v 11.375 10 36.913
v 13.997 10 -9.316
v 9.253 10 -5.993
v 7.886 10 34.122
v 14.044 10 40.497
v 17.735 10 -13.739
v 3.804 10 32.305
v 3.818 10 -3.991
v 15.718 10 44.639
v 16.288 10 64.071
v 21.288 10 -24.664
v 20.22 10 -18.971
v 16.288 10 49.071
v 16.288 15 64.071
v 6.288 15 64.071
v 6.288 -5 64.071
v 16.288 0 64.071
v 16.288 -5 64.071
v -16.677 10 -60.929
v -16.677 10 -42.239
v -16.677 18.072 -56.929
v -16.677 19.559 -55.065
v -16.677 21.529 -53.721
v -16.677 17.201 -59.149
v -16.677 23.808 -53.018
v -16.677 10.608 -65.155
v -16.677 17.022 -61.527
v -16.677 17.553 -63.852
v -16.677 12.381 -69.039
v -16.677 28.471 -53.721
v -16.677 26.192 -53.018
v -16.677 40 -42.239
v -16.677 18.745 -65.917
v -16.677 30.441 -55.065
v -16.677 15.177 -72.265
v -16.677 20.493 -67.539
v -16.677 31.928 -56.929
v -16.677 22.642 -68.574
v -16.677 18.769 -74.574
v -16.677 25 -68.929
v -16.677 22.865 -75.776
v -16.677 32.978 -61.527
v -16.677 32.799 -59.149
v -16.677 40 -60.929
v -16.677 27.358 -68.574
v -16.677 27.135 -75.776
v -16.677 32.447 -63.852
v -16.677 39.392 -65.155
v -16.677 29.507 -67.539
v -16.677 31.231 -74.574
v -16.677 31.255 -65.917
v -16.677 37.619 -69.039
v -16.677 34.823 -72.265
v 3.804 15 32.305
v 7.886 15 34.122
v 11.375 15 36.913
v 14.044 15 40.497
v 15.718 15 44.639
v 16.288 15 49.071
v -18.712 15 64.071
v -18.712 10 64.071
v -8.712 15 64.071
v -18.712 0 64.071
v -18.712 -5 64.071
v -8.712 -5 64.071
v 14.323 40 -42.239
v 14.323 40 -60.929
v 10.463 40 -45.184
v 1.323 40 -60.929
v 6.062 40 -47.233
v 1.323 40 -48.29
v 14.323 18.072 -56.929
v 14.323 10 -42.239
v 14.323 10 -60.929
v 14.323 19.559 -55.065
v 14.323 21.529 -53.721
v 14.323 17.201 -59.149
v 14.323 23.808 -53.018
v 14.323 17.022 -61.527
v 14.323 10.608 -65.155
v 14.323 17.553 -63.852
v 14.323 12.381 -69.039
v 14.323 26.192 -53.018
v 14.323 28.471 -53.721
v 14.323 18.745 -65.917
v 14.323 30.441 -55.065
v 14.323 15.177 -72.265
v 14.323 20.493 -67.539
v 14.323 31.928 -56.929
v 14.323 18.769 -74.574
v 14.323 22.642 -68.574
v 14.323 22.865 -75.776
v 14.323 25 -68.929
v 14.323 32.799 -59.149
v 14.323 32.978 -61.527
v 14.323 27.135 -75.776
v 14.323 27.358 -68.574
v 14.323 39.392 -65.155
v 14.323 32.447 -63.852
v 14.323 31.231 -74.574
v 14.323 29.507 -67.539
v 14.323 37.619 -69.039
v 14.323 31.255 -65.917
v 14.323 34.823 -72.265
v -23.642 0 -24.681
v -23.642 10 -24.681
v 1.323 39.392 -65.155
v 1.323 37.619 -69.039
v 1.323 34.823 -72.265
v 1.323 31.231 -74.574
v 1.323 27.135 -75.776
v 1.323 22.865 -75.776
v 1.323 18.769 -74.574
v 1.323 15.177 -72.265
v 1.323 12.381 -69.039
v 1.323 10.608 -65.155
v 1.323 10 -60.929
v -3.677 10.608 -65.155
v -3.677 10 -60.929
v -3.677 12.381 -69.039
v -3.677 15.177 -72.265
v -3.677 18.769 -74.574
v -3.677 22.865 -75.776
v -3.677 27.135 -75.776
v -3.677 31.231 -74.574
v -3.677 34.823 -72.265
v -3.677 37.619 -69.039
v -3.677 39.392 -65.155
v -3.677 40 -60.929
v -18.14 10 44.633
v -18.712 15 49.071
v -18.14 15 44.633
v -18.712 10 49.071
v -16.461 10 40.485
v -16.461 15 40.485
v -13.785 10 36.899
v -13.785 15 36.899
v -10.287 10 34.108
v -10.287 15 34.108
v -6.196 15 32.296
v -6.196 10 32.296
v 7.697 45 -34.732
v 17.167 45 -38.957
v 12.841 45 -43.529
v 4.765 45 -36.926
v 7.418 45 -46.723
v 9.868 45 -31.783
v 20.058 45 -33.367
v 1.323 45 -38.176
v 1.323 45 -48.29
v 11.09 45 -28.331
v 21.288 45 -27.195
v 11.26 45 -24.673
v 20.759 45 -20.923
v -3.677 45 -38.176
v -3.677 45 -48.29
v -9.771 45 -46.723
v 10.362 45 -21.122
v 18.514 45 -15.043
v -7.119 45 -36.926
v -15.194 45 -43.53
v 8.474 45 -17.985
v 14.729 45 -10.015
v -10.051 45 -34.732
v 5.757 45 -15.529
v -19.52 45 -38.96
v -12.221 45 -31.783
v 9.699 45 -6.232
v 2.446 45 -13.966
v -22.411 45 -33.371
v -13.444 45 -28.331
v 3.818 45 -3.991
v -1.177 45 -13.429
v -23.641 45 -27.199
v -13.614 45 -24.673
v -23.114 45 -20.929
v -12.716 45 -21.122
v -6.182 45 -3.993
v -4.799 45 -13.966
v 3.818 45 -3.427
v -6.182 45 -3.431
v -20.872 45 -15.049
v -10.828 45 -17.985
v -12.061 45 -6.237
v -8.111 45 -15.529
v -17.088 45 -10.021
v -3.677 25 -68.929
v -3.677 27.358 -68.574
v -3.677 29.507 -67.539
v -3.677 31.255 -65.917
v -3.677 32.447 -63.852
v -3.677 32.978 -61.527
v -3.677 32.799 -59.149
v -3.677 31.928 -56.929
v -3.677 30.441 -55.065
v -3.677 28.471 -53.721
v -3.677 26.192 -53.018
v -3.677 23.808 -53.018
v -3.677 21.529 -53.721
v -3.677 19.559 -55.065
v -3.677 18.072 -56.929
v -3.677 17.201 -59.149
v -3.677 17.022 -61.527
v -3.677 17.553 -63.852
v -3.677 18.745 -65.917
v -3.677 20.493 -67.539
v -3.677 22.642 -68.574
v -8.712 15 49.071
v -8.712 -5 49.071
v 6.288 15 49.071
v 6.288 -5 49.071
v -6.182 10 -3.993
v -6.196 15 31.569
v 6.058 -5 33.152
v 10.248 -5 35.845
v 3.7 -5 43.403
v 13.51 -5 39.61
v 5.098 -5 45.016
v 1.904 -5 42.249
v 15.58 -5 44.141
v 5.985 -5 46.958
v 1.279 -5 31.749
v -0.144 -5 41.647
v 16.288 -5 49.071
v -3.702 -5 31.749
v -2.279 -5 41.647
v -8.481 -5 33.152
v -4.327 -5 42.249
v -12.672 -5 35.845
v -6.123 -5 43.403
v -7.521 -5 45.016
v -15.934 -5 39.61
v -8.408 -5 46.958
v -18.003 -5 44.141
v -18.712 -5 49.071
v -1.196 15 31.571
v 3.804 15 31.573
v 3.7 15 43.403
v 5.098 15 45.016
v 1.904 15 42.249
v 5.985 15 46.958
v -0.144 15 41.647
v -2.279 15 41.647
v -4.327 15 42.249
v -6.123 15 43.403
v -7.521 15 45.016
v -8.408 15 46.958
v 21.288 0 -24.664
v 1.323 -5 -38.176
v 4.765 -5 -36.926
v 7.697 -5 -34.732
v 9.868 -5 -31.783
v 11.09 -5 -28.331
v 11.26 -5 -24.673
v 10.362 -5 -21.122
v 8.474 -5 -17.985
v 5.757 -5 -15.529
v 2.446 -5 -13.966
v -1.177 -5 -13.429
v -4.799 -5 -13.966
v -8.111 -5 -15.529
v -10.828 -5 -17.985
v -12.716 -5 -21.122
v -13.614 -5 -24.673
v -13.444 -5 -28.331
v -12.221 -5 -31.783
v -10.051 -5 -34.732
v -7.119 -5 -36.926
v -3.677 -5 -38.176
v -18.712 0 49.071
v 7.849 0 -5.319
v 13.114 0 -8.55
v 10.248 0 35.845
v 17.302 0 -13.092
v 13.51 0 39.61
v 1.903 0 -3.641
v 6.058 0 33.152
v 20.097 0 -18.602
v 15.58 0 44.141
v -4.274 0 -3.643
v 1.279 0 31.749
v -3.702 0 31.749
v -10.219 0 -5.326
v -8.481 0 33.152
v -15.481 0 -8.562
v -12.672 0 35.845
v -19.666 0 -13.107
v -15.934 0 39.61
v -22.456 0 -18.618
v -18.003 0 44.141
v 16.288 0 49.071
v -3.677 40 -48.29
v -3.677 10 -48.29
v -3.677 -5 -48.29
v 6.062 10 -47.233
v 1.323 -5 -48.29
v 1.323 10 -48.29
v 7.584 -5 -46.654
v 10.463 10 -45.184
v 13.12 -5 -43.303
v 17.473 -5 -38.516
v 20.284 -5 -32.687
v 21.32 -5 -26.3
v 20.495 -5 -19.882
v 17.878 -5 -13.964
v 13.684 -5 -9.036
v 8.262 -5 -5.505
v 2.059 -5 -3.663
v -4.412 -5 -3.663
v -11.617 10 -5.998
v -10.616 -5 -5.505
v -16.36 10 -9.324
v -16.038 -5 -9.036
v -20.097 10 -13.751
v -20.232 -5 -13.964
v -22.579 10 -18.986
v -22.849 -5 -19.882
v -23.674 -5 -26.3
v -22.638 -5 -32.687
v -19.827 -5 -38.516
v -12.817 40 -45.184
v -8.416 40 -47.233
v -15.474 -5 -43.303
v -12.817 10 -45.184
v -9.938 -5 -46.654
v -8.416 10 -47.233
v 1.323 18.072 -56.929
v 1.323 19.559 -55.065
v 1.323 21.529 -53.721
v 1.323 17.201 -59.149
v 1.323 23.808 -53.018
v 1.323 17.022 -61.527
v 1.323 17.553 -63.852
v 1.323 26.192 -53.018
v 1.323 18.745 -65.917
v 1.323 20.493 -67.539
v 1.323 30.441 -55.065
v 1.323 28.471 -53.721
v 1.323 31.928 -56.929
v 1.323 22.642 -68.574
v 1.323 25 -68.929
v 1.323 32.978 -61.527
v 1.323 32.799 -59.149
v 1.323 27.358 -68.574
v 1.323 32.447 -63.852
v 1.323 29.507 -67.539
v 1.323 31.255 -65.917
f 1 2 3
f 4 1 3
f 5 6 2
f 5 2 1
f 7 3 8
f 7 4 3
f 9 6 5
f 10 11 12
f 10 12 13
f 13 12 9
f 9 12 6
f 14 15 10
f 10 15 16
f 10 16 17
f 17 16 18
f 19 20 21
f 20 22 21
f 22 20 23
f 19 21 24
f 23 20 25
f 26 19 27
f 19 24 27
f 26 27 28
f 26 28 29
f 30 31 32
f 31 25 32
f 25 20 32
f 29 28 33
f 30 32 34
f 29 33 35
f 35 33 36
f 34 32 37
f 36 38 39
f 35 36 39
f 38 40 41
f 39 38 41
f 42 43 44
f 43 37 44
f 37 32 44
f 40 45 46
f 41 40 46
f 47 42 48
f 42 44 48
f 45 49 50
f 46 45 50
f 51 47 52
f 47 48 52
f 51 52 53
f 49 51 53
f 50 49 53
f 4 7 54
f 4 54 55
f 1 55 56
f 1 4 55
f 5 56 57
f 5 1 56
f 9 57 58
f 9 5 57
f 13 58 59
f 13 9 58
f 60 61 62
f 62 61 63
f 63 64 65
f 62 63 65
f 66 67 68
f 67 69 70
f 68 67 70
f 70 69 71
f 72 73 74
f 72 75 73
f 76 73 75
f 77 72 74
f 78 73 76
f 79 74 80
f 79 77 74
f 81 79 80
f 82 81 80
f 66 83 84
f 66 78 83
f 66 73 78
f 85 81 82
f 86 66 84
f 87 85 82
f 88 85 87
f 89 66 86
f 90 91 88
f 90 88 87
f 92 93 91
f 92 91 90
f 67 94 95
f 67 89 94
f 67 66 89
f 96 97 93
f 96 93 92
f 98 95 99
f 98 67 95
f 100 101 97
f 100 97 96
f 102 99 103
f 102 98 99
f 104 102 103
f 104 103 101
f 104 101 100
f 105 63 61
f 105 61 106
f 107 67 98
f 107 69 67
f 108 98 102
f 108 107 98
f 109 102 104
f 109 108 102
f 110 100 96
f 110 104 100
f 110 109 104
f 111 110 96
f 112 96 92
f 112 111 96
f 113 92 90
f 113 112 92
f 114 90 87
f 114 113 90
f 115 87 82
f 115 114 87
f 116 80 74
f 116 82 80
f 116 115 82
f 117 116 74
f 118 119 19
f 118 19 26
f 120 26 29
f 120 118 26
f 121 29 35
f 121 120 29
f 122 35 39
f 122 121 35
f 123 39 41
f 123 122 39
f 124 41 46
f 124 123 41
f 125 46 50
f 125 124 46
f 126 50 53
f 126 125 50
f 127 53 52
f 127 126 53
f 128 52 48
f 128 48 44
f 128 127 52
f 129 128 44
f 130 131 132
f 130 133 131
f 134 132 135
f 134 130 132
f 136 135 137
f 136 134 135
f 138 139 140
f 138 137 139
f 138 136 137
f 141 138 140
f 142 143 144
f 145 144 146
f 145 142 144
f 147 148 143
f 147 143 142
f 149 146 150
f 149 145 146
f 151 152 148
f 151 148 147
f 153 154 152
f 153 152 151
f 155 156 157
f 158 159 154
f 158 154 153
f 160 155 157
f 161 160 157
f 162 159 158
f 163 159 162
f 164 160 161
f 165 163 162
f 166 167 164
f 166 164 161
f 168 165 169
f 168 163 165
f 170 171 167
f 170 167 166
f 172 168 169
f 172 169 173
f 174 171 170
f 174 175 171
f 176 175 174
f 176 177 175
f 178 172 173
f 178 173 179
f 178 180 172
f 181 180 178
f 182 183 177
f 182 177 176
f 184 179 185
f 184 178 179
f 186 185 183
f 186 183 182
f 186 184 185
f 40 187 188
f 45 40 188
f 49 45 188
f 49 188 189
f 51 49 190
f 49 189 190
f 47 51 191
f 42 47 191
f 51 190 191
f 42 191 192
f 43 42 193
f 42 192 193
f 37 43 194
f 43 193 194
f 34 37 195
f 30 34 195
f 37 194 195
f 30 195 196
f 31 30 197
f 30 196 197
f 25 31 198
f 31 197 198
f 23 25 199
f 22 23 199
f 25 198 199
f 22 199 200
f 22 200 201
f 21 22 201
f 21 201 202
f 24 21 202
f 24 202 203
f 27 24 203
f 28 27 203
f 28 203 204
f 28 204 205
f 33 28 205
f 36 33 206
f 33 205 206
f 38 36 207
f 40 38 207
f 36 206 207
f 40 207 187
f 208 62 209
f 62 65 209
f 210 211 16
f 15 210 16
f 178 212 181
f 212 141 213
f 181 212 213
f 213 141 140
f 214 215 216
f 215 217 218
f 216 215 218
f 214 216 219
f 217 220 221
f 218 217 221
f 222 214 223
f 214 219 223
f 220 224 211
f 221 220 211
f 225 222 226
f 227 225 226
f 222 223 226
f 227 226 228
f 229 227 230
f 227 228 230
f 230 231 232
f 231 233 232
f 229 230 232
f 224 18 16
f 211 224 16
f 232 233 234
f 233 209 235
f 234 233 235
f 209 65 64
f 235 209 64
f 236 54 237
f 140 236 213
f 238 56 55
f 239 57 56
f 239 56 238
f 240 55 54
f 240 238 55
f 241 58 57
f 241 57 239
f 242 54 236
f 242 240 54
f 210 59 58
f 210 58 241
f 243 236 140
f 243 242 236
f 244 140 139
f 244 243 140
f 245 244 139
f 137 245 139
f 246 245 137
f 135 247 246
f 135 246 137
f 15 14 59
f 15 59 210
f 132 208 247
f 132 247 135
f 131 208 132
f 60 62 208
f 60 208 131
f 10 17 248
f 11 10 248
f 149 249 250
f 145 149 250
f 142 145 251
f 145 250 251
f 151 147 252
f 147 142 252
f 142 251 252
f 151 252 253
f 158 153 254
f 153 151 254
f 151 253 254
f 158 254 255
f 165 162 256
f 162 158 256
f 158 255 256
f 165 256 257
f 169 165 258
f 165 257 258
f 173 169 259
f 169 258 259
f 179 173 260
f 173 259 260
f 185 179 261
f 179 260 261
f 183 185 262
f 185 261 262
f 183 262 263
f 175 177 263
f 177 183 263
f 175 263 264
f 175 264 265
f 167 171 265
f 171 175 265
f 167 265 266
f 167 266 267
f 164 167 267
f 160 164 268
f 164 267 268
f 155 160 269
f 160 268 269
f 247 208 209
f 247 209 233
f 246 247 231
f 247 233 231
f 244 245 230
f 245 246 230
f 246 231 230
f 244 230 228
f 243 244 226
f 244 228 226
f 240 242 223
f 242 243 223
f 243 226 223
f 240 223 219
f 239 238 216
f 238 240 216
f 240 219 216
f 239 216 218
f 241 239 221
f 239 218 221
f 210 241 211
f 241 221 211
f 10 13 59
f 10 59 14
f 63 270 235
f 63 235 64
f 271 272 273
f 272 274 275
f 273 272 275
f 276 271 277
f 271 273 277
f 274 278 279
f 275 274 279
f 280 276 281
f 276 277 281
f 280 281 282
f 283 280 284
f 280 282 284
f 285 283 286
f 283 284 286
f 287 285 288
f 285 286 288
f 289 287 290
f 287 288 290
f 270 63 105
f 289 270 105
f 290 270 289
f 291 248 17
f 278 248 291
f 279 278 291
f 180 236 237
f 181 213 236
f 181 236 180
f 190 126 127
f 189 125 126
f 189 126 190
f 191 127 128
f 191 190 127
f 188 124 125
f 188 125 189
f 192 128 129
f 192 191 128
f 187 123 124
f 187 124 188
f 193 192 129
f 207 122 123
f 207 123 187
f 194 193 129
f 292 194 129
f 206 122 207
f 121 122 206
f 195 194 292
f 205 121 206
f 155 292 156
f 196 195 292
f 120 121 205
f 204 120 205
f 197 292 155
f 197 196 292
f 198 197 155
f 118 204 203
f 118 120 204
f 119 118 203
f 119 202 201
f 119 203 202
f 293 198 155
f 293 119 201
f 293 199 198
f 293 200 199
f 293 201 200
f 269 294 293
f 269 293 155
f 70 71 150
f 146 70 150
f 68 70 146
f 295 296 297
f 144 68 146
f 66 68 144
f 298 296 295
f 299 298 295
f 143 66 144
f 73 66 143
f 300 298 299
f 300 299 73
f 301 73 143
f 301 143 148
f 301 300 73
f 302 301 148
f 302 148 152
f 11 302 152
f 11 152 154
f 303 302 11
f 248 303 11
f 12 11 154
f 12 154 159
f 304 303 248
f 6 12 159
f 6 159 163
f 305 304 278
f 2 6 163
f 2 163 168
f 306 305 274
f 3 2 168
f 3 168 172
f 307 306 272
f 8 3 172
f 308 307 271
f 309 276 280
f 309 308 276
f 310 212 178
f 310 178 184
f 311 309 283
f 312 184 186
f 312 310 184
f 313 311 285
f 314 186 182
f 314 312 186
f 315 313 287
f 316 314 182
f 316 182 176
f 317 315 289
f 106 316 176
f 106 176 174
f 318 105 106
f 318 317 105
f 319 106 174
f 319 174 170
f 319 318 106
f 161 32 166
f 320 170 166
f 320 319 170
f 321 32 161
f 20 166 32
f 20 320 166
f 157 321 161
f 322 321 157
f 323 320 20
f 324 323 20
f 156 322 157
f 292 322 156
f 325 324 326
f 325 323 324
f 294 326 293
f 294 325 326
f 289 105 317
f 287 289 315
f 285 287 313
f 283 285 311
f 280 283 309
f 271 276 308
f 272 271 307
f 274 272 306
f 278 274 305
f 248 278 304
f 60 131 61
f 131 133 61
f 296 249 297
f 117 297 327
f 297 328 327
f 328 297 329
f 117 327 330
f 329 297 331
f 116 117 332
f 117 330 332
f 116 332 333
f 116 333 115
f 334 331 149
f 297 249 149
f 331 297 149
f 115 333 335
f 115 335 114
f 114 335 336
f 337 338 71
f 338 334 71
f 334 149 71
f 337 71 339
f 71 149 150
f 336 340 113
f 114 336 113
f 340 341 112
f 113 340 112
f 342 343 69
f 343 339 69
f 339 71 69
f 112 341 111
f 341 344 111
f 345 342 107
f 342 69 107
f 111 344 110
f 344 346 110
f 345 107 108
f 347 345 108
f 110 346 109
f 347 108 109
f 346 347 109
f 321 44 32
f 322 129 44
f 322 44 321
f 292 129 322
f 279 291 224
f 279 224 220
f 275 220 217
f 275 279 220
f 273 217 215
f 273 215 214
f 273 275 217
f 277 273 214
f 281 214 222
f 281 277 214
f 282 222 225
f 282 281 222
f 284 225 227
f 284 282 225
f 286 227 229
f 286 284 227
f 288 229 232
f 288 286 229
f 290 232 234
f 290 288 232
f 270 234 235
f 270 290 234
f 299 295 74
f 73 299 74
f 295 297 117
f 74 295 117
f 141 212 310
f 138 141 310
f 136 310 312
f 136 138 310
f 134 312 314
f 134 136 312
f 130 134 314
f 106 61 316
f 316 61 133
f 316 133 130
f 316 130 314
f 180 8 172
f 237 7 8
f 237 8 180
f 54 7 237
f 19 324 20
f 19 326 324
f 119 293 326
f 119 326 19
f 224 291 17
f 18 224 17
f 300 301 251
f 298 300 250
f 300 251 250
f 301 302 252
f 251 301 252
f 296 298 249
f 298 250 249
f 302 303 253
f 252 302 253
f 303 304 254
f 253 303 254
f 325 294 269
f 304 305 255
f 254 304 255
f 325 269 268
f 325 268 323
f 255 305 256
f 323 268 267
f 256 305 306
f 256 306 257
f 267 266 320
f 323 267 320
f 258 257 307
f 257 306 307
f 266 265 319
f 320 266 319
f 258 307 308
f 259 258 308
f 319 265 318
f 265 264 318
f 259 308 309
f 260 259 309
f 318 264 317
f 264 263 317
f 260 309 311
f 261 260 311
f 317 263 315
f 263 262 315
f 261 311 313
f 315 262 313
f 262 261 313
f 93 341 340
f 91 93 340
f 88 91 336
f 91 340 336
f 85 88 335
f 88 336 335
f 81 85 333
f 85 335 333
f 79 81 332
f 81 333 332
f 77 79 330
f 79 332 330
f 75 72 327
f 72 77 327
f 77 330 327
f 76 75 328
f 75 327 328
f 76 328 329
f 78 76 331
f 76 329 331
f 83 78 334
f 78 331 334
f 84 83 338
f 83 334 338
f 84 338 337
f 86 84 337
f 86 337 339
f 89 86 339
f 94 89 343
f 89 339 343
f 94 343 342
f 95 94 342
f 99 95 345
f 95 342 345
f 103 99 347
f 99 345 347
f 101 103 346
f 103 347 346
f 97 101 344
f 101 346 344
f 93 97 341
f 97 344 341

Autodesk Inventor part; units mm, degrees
ref_plane "YZ Plane" through (0, 0, 0) normal (1, 0, 0) x (0, 1, 0)
ref_plane "XZ Plane" through (0, 0, 0) normal (0, 1, 0) x (-1, 0, 0)
ref_plane "XY Plane" through (0, 0, 0) normal (0, 0, 1) x (1, 0, 0)
sketch "Náčrt3" plane through (0, 0, 0) normal (0, 1, 0) x (-1, 0, 0)
  line L0 (18.7116, 64.0709) -> (8.7116, 64.0709)
  line L1 (8.7116, 64.0709) -> (8.7116, 49.0709)
  arc A0 (-6.2884, 49.0709) -> (8.7116, 49.0709) centre (1.2116, 49.0709) ccw
  line L2 (-6.2884, 49.0709) -> (-6.2884, 64.0709)
  line L3 (-6.2884, 64.0709) -> (-16.2884, 64.0709)
  arc A1 (3.6769, -38.1765) -> (-1.3231, -38.1765) centre (1.1769, -25.9291) ccw
  arc A2 (3.6769, -48.2898) -> (-1.3231, -48.2898) centre (1.1769, -25.9291) ccw
  line L4 (18.7116, 64.0709) -> (23.6423, -24.681)
  line L5 (-16.2884, 64.0709) -> (-21.2875, -24.6635)
  arc A3 (-16.2884, 49.0709) -> (18.7116, 49.0709) centre (1.2116, 49.0709) ccw
  line L6 (18.7116, 49.0709) -> (18.7116, 64.0709)
  line L7 (-16.2884, 49.0709) -> (-16.2884, 64.0709)
  line L8 (-1.3231, -38.1765) -> (-1.3231, -48.2898)
  line L9 (3.6769, -48.2898) -> (3.6769, -38.1765)
  point P0 (0, 0)
  dimension "d0" = 10
  dimension "d1" = 10
  dimension "d2" = 15
  dimension "d3" = 15
  dimension "d4" = 7.5
  dimension "d5" = 25
  dimension "d6" = 45
  dimension "d7" = 75
  dimension "d11" = 3.18
  dimension "d12" = 22.2368
  dimension "d13" = 18.7116
  dimension "d16" = 15.0347
  dimension "d17" = 20.0347
extrude "Vysunutí1" add sketch "Náčrt3" against normal blind 5 contours L6 A3 L7 L3 L2 A0 L1 L0 | A2 L9 A1 L8
extrude "Vysunutí2" add sketch "Náčrt3" along normal blind 10 contours L4 A2 L5 L7 A3 L6
extrude "Vysunutí3" add sketch "Náčrt3" along normal blind 15 contours L6 A3 L7 L3 L2 A0 L1 L0
extrude "Vysunutí4" add sketch "Náčrt3" along normal blind 45 contours A2 L9 A1 L8
ref_plane "Pracovní rovina1" through (-1.3339, 0, 376.8696) normal (1, 0, 0.0004) x (0, 1, 0)
sketch "Náčrt4" plane through (-1.3339, 0, 376.8696) normal (1, 0, 0.0004) x (0, 1, 0)
  line L0 (45, -425.1604) -> (45, -380.2987) projected
  line L1 (15, -345.2987) -> (45, -380.2987)
  line L2 (45, -380.2987) -> (45, -385.2987)
  line L3 (45, -385.2987) -> (10, -385.2987)
  line L4 (10, -401.5419) -> (10, -312.7919) projected
  line L5 (15, -345.2987) -> (15, -327.7919) projected
  line L6 (10, -345.2987) -> (10, -385.2987)
  line L7 (15, -345.2987) -> (15, -343.2987)
  line L8 (15, -343.2987) -> (10, -343.2987)
  line L9 (10, -327.7919) -> (10, -345.2987) projected
  line L10 (15, -343.2987) -> (10, -343.2987)
  line L11 (10, -345.2987) -> (10, -343.2987)
  point P0 (0, -376.8701)
  point P1 (45, -425.1584)
  point P2 (15, -327.8055)
  point P3 (10, -327.8055)
  dimension "d26" = 5
  dimension "d28" = 42
extrude "Vysunutí5" add sketch "Náčrt4" along normal blind 5
extrude "Vysunutí6" add sketch "Náčrt4" against normal blind 5
sketch "Náčrt7" plane through (-3.6769, -5, -38.1765) normal (1, 0, 0) x (0, 0, -1)
  line L0 (0, 15) -> (10.2526, 15)
  line L1 (10.2526, 15) -> (22.7526, 15)
  line L2 (22.7526, 45) -> (0, 45)
  line L3 (0, 45) -> (0, 15)
  arc A0 (22.7526, 15) -> (22.7526, 45) centre (22.7526, 30) ccw
  circle A1 centre (22.7526, 30) radius 8
  point P0 (-38.1765, 5)
  dimension "d45" = 12.5
  dimension "d46" = 30
  dimension "d47" = 16
  dimension "d48" = 10
  dimension "d49" = 38.1765
  dimension "d50" = 22.7525
extrude "Vysunutí7" add sketch "Náčrt7" along normal blind 18
extrude "Vysunutí8" cut sketch "Náčrt7" along normal blind 5
extrude "Vysunutí9" add sketch "Náčrt7" against normal blind 13
properties part number "2"
